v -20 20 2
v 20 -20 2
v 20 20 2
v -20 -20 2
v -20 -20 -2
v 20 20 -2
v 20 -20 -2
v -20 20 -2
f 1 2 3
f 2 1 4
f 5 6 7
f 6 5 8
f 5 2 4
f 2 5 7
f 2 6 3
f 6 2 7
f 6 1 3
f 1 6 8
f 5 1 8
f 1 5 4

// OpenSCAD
// Fixture: the OpenSCAD half of the `stand` mode.
//
// Every parameter the platform passes arrives as `-D name=value`, which OVERRIDES the
// declaration below. OpenSCAD accepts a `-D` for a name the file never mentions in
// silence, so a declaration with no corresponding USE is a slider that moves nothing —
// which is exactly what `phone_angle` is here, standing in for portacosas.

base_w = 40;        // ALIVE: declared here, used in the module below.
phone_angle = 65;   // DEAD: portacosas.phone_angle — this line and nowhere else.
mat_width = 50;     // DEAD: framing-hyperobject.mat_width — and absent from stand.py.
render_mode = 0;
target_part = "stand";

module stand() {
    // `base_w` is read here: that is what makes it a reference and not a declaration.
    cube([base_w, base_w, 4], center = true);
}

stand();
